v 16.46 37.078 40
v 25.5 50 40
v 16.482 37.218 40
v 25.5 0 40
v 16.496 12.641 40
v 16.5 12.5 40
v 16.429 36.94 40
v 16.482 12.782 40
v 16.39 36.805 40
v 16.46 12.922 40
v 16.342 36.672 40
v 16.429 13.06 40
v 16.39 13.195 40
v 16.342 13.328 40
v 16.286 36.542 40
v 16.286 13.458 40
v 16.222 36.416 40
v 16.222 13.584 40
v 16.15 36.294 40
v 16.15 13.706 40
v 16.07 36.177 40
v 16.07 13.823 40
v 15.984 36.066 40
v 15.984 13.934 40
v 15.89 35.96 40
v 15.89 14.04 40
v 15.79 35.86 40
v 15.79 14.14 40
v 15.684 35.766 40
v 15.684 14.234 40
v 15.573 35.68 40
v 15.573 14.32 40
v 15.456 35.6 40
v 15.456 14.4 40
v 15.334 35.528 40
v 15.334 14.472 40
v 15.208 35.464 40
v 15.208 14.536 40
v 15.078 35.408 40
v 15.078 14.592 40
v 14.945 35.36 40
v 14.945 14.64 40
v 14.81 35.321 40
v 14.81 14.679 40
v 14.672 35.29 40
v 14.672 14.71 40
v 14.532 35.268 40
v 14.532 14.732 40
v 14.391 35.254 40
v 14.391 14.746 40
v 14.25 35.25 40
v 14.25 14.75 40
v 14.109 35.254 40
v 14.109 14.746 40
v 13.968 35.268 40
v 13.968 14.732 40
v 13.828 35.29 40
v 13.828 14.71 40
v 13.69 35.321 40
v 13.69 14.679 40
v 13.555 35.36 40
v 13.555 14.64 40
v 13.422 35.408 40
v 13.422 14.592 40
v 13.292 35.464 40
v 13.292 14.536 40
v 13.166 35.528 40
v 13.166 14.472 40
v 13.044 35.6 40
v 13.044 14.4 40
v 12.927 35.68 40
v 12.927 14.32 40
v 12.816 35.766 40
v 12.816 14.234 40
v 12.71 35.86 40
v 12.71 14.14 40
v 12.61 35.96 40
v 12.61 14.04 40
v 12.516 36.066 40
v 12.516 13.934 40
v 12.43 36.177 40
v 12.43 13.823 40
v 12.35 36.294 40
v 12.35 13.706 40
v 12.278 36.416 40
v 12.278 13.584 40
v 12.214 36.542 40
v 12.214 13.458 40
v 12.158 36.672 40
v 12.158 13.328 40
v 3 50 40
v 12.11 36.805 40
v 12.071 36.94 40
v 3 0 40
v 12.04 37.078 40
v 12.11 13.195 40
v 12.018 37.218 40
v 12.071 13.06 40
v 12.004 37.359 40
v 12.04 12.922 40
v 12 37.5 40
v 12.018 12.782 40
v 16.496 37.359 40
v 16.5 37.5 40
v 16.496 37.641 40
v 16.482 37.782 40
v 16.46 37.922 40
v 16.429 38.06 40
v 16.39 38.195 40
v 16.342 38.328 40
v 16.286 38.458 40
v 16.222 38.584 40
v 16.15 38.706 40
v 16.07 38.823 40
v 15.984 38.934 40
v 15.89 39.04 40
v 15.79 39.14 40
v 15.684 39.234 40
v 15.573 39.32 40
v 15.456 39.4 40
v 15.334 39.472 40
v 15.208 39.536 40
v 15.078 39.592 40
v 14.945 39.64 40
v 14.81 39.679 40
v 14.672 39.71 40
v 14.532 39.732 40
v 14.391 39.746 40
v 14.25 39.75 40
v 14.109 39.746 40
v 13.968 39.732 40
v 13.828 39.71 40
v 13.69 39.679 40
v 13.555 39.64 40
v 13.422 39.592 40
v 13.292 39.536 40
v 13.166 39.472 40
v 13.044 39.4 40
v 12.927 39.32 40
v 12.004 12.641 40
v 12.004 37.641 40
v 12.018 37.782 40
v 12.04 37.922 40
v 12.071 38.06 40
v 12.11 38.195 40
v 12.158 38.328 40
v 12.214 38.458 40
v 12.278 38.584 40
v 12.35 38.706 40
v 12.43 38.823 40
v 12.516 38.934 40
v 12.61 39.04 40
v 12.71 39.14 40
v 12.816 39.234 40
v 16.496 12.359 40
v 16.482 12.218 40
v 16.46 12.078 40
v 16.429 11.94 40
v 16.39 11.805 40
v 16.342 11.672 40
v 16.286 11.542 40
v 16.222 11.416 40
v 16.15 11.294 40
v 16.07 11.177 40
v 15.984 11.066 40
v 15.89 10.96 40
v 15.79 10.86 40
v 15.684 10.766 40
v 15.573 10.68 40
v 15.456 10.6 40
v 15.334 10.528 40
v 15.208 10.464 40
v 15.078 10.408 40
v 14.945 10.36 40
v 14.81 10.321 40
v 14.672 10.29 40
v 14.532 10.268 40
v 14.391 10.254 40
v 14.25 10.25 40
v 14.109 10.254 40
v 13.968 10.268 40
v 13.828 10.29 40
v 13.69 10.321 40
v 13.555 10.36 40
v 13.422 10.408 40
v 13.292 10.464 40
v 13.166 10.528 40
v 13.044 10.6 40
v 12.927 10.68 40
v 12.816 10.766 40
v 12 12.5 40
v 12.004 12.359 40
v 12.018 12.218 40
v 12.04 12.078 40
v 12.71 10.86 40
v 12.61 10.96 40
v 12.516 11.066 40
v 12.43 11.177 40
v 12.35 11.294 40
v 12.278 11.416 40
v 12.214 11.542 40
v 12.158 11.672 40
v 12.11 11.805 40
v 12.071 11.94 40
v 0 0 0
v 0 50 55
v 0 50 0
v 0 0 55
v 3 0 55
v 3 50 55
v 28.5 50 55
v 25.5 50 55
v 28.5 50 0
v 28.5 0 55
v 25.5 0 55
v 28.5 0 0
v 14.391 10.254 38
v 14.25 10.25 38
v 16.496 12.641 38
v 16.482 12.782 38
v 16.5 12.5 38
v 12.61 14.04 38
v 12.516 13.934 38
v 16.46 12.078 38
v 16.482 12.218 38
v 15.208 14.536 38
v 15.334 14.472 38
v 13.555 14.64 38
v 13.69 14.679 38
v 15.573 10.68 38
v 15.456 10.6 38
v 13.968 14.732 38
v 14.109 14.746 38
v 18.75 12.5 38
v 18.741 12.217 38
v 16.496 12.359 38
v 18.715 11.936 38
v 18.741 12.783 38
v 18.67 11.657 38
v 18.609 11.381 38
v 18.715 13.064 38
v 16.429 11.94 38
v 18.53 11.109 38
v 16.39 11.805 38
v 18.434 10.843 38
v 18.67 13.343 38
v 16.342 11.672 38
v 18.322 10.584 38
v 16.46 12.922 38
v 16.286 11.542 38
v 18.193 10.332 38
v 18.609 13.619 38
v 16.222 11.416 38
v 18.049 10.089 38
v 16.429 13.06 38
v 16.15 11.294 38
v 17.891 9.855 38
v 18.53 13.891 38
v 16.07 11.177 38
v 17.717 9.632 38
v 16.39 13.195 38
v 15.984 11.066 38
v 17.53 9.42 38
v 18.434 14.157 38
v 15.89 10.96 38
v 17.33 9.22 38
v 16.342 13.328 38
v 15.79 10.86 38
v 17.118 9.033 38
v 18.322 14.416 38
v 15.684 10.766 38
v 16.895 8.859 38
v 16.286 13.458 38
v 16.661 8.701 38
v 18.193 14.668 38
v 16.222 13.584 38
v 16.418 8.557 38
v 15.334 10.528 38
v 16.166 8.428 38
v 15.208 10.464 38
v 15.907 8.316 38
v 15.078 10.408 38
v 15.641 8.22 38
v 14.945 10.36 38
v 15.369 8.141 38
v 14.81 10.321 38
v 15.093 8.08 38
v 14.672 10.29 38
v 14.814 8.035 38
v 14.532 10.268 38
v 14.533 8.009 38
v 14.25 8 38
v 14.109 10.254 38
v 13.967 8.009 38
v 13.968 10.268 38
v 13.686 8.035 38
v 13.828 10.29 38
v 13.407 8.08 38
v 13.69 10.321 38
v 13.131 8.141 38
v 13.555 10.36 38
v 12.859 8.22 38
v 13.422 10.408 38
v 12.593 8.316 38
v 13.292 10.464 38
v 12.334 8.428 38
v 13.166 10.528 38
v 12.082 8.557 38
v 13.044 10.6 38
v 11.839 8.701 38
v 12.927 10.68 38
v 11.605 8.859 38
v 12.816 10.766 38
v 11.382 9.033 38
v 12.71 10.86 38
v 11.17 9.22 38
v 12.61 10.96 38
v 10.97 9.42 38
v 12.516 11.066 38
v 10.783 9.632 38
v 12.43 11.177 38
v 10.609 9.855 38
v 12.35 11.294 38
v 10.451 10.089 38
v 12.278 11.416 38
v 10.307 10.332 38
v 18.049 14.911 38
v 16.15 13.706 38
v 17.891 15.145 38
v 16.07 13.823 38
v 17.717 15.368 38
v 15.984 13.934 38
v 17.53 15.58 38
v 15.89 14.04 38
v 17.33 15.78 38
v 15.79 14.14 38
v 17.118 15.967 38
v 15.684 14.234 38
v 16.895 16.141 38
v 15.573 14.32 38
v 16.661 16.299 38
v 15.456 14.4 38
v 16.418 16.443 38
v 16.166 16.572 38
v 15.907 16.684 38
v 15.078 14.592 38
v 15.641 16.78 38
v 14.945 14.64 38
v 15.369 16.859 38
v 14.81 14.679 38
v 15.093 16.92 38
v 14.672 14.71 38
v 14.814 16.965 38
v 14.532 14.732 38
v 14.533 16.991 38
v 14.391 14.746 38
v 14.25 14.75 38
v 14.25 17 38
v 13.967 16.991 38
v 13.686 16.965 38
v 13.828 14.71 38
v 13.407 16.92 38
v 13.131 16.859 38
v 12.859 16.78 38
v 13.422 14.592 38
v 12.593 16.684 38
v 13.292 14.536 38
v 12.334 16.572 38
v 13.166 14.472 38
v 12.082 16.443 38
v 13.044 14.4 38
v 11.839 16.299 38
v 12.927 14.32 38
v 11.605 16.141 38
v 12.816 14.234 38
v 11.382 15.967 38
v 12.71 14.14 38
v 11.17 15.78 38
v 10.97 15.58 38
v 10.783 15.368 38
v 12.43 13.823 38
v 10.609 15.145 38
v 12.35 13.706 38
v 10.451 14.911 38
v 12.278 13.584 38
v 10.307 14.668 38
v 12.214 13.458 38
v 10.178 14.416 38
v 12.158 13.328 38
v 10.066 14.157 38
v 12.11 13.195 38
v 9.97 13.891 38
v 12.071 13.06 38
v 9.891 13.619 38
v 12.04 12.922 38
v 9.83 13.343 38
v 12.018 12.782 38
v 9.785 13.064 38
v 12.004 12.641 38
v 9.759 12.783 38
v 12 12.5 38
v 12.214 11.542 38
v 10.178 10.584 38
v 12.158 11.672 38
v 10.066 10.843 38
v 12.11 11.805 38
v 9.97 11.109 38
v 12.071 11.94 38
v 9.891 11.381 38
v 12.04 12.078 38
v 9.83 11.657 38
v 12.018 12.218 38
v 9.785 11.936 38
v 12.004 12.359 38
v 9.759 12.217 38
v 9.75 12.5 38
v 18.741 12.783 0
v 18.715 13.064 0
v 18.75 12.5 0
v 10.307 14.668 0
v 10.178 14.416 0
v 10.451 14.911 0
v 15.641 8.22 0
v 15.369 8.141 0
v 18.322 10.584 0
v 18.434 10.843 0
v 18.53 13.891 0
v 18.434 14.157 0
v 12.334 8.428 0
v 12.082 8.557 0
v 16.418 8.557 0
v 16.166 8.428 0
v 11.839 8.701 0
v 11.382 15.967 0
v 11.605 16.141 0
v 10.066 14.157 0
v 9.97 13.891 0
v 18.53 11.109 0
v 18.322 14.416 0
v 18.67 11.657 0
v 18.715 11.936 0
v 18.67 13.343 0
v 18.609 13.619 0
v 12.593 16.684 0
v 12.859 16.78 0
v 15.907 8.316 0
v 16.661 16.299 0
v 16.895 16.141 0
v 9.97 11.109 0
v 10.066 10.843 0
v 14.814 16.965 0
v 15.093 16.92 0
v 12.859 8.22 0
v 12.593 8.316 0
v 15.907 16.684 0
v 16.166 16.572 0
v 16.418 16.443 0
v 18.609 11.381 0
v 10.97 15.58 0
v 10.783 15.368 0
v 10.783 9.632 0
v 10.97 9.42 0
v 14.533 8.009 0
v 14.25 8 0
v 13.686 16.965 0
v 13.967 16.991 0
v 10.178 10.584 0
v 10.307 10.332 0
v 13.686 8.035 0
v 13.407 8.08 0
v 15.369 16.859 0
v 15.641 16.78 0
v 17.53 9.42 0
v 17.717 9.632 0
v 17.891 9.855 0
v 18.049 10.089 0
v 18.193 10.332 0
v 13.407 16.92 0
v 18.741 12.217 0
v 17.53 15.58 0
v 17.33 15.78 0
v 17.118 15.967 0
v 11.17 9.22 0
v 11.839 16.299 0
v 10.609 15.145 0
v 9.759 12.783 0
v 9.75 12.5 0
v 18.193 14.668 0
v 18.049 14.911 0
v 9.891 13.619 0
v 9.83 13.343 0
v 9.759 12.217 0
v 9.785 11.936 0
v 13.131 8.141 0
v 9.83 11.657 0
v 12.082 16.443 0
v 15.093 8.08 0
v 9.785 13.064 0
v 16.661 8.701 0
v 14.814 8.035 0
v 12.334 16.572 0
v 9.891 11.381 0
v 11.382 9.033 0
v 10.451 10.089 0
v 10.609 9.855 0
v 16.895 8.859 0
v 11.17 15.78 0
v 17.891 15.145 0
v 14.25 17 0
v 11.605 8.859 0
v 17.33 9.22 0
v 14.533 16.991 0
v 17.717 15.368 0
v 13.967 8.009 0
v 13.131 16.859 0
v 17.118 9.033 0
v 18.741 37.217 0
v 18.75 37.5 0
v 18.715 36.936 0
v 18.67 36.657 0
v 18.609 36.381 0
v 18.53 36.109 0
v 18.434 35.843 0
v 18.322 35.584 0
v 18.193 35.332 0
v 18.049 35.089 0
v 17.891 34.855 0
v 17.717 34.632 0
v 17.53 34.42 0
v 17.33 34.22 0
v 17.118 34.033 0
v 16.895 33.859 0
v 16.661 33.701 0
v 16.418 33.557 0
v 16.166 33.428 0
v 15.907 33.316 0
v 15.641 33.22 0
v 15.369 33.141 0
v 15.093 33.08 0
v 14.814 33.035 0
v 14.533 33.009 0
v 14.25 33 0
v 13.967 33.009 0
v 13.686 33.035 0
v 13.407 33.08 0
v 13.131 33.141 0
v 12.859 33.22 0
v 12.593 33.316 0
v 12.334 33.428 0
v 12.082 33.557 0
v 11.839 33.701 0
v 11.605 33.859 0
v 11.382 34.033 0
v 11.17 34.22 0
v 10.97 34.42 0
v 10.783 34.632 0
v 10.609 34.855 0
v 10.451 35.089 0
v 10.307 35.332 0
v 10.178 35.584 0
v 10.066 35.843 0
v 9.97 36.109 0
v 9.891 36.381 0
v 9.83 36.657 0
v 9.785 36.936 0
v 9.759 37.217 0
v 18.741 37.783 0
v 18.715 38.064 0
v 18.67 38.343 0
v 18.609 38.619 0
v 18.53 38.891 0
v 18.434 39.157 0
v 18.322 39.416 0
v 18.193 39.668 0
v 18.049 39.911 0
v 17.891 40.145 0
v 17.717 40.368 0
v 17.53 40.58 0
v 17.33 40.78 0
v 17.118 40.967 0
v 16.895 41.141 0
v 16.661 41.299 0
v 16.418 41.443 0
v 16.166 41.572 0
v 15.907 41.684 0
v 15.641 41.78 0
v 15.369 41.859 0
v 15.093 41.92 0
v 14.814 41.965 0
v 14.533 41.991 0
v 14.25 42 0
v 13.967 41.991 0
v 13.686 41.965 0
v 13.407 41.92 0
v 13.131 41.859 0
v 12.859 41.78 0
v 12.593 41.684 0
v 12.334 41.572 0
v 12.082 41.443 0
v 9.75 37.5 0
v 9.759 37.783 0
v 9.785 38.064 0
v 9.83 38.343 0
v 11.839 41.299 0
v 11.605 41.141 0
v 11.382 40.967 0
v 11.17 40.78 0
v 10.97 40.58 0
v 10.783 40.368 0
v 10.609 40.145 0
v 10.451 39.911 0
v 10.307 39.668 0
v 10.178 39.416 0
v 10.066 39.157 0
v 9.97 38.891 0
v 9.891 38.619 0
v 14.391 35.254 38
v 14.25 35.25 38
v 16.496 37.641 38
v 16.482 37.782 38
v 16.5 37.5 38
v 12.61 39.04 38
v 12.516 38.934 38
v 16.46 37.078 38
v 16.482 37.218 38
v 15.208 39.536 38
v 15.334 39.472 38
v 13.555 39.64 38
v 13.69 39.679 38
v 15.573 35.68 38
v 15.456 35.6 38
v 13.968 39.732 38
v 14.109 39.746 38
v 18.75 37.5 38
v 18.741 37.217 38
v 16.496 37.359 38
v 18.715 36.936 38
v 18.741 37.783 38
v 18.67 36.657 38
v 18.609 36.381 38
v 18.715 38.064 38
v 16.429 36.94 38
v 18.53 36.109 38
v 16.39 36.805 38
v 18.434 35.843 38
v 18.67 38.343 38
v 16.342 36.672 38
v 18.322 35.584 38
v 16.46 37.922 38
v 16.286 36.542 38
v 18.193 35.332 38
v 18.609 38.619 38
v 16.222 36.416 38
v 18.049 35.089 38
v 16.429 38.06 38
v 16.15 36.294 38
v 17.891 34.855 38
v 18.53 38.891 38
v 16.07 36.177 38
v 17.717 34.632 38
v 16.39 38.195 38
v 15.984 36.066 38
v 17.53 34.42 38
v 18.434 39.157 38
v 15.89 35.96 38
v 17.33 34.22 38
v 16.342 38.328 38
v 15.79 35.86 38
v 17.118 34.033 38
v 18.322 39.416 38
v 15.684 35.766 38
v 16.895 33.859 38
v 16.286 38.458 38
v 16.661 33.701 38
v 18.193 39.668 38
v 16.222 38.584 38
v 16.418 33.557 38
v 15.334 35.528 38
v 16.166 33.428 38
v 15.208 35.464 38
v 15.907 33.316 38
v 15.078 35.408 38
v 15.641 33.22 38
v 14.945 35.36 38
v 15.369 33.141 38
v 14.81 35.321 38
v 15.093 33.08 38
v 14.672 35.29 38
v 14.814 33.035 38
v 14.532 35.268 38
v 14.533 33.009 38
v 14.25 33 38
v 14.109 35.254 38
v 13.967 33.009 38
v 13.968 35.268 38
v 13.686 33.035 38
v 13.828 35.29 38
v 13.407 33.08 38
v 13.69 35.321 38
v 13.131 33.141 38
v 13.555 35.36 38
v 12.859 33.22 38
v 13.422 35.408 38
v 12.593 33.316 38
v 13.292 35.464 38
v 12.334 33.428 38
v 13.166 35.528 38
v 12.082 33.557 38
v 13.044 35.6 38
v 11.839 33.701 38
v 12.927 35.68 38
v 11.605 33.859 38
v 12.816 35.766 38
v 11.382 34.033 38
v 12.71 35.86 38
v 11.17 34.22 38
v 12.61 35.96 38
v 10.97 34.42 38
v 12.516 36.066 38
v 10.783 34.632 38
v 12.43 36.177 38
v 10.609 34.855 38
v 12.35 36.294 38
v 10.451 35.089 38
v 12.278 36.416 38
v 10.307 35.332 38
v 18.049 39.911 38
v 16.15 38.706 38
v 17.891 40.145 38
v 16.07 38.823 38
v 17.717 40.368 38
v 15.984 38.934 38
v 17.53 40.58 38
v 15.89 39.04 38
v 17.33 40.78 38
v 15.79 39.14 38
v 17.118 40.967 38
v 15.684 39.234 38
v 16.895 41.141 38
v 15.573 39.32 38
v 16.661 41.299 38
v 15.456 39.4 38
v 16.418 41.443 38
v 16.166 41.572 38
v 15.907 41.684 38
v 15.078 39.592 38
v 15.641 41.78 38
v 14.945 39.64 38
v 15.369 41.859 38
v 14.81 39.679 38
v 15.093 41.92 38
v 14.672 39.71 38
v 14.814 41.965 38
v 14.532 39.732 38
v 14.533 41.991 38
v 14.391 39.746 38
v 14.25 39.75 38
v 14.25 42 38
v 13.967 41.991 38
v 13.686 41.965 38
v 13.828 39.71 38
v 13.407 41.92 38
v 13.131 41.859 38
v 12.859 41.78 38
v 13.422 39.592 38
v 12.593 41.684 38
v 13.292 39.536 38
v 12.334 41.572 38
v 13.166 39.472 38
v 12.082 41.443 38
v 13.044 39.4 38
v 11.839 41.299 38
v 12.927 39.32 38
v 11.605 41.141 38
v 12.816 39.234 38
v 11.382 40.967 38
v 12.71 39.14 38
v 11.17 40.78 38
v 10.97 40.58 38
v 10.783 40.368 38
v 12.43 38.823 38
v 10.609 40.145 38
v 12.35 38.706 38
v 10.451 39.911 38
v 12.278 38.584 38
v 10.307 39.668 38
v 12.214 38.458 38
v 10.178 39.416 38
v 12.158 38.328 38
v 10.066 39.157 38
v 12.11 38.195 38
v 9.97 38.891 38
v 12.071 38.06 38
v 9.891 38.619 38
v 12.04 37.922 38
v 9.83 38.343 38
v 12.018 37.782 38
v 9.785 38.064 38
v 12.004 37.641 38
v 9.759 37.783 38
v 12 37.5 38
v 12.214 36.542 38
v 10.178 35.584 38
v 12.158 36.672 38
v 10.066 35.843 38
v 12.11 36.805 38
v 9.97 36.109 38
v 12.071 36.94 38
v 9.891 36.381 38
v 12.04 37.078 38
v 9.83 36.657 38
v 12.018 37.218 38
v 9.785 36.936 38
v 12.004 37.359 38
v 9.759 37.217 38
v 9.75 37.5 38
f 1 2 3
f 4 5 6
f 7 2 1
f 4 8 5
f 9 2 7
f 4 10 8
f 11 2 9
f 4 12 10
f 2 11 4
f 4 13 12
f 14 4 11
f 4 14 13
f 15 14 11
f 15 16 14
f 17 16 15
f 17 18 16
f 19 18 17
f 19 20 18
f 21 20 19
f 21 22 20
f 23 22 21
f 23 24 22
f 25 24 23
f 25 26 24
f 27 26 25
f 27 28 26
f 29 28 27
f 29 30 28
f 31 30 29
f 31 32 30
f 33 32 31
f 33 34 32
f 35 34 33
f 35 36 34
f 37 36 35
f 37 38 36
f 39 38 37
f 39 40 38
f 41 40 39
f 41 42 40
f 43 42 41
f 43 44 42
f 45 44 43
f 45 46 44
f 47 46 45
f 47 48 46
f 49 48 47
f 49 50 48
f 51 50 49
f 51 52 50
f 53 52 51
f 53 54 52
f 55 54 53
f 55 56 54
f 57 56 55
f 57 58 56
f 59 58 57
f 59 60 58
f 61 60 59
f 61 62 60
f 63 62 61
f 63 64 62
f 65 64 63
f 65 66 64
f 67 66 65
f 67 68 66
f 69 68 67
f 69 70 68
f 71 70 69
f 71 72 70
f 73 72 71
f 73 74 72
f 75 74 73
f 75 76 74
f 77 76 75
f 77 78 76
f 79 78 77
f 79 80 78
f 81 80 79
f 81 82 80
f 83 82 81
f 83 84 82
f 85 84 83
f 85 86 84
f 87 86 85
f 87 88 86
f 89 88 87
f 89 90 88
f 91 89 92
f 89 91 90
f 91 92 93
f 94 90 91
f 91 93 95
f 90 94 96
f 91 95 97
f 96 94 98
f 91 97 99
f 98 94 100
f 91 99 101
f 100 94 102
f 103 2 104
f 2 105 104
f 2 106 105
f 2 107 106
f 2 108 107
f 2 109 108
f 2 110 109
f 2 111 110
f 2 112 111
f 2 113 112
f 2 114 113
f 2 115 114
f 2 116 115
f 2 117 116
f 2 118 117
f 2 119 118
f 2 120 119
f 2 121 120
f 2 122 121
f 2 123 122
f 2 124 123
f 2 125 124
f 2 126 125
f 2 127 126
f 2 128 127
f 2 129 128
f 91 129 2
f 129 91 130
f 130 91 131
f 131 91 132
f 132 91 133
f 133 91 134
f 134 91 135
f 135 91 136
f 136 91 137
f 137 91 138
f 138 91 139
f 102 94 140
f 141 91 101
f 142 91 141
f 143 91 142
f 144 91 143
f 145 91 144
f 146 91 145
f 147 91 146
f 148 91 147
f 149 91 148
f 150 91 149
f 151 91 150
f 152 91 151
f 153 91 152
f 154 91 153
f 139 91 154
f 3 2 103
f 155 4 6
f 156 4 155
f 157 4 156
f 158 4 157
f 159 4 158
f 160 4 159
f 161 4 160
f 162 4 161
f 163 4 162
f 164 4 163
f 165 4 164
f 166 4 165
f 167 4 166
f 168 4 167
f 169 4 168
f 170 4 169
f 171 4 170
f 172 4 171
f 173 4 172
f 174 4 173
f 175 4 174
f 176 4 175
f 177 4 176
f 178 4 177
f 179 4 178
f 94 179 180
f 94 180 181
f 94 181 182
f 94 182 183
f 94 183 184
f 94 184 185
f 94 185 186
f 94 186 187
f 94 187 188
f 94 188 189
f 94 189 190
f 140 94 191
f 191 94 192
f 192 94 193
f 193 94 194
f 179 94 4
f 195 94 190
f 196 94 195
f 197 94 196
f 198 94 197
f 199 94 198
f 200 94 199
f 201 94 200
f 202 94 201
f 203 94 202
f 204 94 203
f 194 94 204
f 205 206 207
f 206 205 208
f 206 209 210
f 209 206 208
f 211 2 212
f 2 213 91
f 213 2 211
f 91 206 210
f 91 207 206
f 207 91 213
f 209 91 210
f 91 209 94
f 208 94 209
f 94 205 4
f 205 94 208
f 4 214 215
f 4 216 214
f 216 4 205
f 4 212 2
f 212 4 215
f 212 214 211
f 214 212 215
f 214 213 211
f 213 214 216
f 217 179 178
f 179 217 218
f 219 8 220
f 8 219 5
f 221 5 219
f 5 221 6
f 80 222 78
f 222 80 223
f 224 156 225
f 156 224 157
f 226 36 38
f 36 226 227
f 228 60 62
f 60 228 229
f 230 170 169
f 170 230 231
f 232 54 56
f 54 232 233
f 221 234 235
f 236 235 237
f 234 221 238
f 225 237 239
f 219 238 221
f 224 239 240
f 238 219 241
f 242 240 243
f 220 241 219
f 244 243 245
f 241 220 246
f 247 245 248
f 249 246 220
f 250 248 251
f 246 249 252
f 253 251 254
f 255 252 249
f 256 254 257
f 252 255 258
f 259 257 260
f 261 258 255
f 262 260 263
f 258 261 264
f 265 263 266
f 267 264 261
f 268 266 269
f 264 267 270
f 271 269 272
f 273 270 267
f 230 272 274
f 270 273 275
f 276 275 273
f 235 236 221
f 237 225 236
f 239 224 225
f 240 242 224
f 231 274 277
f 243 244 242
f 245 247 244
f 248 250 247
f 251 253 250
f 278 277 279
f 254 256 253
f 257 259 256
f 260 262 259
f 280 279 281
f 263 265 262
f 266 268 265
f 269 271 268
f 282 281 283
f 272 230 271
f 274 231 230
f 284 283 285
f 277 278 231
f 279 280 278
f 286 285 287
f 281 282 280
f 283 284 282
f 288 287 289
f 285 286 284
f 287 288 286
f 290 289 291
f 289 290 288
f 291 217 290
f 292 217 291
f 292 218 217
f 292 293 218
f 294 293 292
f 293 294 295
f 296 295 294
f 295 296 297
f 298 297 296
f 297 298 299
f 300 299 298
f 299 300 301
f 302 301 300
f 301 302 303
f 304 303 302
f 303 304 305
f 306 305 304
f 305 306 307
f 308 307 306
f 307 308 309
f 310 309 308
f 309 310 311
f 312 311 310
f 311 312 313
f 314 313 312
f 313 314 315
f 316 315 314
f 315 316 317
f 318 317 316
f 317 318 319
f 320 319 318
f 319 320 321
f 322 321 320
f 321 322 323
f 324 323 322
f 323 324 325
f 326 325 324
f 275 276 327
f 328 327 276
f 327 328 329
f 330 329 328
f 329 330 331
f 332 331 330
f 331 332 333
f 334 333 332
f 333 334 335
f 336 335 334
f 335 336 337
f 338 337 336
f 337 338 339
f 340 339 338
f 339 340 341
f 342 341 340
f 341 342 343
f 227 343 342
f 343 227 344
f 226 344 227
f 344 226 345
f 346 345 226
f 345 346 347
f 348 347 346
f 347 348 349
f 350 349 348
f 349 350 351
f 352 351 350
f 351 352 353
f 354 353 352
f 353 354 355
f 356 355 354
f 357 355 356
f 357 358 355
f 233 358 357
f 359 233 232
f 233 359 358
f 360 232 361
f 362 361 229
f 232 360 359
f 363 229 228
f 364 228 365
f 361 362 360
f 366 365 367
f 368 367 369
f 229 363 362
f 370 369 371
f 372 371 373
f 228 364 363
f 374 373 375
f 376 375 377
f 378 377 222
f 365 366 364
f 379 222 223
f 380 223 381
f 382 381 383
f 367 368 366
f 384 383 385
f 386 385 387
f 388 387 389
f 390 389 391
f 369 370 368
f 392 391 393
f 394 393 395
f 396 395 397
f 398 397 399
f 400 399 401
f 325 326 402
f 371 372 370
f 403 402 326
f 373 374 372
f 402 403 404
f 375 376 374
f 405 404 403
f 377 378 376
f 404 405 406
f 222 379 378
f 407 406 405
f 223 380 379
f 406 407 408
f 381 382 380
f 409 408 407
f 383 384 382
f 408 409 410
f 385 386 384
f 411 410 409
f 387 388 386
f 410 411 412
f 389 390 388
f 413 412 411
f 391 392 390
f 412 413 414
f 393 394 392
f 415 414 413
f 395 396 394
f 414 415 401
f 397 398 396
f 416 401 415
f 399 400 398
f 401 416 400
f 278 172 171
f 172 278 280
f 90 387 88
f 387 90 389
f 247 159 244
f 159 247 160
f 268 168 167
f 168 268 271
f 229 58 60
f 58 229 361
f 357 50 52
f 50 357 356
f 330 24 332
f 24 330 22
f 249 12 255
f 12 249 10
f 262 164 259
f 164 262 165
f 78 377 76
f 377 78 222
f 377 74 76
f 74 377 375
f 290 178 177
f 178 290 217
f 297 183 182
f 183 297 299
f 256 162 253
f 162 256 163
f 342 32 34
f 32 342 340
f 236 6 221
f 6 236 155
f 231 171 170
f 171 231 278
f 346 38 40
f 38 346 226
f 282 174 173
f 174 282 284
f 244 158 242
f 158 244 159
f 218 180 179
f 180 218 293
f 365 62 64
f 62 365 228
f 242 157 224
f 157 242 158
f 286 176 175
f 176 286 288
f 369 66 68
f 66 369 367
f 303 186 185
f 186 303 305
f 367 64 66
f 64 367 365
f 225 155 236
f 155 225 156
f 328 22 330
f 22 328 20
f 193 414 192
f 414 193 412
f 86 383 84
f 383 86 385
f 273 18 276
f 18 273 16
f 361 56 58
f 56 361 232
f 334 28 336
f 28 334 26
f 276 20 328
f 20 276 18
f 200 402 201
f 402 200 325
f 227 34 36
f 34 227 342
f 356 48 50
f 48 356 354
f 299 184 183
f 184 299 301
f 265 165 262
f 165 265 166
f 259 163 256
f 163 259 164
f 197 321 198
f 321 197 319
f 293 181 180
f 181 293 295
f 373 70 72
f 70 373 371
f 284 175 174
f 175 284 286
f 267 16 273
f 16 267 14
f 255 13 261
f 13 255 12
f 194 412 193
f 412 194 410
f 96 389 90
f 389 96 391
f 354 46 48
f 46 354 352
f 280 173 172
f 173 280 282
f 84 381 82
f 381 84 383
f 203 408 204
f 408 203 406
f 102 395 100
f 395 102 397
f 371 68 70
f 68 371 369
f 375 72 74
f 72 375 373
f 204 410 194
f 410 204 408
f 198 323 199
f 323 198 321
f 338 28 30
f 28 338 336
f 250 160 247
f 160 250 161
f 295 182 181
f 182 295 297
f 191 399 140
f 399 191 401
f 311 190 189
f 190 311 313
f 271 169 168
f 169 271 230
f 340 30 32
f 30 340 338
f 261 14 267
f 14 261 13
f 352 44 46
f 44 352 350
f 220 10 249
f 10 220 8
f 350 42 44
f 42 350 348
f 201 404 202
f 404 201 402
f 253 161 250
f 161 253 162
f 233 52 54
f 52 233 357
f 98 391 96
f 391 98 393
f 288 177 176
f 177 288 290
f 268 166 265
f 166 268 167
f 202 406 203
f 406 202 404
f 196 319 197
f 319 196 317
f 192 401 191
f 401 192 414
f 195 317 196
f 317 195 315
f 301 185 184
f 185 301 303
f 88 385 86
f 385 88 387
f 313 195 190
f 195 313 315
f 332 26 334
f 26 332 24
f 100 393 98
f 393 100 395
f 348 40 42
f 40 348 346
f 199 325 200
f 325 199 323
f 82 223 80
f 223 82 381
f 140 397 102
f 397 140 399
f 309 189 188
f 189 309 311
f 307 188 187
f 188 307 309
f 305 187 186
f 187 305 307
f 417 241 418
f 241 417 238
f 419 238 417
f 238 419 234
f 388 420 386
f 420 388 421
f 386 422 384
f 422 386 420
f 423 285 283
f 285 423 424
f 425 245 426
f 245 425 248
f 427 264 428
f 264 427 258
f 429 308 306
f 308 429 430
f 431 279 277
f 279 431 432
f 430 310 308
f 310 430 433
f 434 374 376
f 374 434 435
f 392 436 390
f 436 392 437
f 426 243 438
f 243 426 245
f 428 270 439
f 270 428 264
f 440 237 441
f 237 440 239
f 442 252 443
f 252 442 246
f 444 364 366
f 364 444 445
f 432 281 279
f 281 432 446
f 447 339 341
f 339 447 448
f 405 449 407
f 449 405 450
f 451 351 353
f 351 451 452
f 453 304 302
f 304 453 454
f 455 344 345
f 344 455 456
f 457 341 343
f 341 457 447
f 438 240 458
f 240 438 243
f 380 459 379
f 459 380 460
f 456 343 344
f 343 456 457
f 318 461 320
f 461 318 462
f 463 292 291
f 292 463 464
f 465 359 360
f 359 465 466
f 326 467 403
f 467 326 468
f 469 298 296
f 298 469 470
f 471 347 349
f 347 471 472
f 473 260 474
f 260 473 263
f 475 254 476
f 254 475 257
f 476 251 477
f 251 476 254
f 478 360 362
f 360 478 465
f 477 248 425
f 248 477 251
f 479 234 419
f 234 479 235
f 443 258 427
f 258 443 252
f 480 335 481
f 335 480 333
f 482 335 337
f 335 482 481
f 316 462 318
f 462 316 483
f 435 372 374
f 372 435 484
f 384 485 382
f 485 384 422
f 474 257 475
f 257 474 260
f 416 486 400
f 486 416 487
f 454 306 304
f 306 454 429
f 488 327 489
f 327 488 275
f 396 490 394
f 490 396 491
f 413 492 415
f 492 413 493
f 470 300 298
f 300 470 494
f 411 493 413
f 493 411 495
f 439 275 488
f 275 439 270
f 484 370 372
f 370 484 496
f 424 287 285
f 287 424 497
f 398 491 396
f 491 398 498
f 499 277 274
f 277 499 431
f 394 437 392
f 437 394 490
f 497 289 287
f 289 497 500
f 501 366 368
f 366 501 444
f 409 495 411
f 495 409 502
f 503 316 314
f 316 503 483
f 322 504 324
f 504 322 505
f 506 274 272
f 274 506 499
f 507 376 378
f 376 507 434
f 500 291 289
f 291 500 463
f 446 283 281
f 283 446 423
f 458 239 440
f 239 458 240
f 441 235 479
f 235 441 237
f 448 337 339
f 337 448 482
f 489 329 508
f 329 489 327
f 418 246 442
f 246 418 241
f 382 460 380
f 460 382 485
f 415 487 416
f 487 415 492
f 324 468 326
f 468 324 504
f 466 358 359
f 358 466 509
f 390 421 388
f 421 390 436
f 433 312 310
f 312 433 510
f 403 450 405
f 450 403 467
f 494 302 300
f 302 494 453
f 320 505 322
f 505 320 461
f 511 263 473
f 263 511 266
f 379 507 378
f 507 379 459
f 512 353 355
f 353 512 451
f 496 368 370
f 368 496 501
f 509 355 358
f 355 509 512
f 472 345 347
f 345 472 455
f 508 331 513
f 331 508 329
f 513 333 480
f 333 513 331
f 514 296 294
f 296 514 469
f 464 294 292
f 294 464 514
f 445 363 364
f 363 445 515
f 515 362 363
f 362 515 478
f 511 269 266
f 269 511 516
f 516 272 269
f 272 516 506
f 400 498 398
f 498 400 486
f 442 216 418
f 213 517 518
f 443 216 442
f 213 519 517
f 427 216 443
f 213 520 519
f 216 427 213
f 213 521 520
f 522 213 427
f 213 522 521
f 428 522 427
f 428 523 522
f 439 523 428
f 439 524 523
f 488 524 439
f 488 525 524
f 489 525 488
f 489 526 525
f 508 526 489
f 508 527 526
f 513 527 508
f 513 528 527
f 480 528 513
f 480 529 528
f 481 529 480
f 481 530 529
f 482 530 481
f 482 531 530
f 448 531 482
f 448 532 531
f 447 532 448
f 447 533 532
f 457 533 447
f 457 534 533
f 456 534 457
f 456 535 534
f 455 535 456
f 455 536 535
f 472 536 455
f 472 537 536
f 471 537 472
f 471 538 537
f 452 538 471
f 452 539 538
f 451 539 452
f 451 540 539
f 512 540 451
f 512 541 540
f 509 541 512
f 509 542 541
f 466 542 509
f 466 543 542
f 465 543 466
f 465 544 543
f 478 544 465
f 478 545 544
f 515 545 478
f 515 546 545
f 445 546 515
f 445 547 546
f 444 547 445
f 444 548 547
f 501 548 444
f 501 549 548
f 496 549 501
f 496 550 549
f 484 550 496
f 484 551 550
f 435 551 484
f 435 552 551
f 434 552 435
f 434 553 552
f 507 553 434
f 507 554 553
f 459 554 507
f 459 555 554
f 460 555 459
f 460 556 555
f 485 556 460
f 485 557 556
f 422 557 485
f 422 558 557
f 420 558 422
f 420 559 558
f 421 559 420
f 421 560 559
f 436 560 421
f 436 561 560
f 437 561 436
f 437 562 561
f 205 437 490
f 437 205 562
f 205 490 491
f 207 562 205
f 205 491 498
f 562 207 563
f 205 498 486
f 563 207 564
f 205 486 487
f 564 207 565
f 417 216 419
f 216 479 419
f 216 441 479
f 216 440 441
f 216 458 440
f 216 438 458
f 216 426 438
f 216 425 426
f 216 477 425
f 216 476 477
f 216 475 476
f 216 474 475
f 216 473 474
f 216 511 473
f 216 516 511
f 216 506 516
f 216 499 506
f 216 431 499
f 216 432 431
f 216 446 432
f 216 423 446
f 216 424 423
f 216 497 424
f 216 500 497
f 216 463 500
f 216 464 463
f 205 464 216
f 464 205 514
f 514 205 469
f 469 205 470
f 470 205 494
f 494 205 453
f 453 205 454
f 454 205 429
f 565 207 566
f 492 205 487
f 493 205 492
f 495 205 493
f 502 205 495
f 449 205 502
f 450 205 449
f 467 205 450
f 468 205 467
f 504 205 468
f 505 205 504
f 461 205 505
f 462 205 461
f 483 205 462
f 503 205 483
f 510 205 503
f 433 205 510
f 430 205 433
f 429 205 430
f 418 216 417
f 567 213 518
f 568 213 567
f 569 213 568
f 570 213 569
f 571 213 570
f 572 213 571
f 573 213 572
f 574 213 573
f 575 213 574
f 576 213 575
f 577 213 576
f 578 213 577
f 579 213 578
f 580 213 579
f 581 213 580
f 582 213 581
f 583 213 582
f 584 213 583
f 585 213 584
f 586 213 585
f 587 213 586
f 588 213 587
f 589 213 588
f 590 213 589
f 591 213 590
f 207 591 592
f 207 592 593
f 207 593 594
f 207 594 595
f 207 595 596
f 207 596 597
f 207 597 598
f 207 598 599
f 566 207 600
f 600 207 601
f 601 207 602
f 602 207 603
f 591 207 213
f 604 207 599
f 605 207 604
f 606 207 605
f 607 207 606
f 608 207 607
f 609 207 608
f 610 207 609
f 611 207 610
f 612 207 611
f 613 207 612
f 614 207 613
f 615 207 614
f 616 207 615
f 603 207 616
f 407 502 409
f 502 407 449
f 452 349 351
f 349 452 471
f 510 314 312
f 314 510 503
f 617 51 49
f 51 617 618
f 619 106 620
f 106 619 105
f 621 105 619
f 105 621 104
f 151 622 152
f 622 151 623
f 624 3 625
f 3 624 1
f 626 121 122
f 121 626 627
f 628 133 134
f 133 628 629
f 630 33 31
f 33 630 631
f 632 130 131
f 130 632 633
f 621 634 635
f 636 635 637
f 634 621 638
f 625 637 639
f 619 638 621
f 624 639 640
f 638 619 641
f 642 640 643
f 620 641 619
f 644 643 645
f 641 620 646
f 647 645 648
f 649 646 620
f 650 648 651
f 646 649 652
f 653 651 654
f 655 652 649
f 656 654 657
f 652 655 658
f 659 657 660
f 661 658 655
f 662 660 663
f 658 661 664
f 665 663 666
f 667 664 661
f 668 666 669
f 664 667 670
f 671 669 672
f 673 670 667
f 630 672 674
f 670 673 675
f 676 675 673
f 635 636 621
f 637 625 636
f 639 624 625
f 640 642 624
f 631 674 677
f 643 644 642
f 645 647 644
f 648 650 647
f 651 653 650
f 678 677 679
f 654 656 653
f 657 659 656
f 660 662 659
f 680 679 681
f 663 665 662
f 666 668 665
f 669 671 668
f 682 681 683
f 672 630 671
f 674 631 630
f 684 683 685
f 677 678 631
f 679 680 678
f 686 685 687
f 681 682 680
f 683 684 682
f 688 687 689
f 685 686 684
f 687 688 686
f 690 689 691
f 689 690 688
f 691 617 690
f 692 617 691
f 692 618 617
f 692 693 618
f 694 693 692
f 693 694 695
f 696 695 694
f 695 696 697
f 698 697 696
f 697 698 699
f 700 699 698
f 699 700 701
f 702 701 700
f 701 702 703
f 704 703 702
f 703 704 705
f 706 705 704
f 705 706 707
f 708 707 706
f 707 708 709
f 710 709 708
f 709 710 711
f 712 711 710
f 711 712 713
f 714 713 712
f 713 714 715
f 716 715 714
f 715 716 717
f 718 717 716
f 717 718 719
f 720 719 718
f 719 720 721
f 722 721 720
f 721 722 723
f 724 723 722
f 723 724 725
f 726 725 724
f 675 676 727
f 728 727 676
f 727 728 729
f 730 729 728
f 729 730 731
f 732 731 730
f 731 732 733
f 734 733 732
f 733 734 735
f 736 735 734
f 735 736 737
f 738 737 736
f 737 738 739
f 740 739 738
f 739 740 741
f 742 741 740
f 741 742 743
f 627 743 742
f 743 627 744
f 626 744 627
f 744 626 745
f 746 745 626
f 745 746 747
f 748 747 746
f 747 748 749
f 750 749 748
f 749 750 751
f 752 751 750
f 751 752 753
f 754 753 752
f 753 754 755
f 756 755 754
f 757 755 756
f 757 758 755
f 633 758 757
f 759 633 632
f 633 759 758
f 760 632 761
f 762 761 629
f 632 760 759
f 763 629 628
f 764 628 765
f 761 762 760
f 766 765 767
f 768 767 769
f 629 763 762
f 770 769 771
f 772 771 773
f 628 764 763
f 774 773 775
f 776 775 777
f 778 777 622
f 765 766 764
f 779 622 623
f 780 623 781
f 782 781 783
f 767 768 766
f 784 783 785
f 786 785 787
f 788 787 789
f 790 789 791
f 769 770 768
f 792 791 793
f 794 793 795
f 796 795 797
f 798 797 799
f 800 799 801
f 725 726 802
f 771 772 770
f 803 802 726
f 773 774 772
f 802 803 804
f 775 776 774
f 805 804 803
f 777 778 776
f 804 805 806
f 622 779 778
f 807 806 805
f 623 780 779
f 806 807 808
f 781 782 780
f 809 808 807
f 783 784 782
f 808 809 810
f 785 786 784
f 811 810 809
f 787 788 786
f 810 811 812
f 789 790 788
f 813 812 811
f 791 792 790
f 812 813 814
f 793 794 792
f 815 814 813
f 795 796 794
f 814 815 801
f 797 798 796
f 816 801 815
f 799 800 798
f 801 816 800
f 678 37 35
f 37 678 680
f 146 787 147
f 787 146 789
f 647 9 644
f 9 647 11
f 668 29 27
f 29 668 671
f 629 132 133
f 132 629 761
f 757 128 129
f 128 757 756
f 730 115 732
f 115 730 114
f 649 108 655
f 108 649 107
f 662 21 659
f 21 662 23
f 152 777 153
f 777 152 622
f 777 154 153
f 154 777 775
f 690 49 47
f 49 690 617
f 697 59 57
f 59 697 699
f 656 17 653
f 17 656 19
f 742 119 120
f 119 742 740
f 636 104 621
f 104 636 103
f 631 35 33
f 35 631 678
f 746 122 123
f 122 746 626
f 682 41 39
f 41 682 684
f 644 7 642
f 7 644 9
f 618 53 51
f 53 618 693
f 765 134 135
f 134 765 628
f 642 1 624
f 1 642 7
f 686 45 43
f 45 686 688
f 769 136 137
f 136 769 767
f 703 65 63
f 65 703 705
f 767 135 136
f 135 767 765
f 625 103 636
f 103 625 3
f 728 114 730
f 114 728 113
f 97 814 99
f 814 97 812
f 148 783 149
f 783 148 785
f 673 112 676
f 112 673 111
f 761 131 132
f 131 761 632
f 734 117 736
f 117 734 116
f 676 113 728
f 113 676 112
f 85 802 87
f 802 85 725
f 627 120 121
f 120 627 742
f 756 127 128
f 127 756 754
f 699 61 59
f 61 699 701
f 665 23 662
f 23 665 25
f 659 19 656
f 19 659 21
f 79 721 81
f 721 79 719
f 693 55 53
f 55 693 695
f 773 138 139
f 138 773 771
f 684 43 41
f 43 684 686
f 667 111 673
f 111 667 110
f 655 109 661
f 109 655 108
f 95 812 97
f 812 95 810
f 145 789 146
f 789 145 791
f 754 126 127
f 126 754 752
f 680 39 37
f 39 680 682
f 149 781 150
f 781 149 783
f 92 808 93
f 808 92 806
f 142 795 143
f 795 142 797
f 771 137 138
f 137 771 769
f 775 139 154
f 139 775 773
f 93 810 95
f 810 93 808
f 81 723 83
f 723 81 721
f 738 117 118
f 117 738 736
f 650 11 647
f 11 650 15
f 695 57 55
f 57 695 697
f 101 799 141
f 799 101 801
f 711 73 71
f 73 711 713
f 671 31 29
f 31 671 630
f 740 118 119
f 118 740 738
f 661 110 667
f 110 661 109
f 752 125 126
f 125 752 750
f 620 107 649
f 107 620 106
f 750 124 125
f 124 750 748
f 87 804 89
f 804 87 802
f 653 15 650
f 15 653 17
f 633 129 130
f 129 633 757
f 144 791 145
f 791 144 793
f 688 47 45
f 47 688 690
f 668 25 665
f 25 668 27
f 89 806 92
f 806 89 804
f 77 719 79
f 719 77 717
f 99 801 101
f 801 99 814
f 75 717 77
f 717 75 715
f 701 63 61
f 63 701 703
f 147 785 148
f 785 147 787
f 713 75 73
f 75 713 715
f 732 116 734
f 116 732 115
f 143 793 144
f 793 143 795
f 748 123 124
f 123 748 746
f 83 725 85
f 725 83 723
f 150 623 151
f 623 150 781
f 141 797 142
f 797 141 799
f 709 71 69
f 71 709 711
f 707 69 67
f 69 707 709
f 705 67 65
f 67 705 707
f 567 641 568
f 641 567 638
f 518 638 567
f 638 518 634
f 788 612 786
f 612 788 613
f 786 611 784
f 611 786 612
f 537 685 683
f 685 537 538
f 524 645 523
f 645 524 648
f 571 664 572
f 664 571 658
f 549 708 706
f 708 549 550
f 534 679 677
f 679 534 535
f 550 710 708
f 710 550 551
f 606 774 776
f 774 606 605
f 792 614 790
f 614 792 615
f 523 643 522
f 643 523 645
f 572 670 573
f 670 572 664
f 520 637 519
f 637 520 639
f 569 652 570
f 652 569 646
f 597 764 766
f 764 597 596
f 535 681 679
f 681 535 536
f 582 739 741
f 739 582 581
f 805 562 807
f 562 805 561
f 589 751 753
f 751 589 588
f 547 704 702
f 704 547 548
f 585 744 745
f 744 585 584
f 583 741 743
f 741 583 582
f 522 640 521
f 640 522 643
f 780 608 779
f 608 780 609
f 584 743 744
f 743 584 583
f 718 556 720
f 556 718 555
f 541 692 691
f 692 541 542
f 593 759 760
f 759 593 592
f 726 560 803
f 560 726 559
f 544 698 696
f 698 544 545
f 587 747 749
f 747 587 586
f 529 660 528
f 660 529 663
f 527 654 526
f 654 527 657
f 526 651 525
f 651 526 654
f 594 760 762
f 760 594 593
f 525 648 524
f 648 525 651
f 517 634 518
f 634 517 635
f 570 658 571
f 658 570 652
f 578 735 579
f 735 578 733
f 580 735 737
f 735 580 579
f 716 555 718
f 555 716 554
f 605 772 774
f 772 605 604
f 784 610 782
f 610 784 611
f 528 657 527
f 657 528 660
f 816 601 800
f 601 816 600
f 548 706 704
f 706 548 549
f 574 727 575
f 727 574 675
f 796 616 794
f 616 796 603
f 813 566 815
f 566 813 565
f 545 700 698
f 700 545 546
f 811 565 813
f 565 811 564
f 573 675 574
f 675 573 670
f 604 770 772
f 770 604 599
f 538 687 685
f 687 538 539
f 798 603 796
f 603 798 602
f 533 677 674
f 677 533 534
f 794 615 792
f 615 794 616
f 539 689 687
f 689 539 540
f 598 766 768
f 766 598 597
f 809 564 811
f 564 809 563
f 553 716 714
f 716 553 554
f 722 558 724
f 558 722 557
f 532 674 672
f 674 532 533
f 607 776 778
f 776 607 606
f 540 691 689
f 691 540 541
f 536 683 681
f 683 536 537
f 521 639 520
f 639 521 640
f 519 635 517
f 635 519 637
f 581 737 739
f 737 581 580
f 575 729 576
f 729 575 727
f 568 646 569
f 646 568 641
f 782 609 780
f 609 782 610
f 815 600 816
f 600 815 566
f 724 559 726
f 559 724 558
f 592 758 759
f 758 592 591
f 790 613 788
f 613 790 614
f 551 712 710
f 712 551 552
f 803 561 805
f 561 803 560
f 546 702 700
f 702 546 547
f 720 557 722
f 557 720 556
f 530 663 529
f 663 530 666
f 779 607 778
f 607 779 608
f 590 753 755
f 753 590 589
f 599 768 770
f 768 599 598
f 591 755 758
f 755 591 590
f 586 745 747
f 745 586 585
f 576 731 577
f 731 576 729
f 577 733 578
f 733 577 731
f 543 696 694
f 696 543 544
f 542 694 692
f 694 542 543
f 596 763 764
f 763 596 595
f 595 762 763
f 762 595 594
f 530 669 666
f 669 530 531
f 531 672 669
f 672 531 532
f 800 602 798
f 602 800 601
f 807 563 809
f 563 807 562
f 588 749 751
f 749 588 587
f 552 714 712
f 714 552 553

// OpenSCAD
// preview[view:south east, tilt:top diagonal]



/* [Screw holes] */

// The screw hole radius at the bottom. The top screw hole is half of this. Wiggle is applied.
screwHoleRadius = 4;



/* [Dimensions] */

// Depth of the whole thing.
depth = 50;

// Width of the slot sides.
sideWidth = 3;

// Width of the slot. This should equal to the width of your table leg. Wiggle is applied.
slotWidth = 22;

// Height of the slot.
slotHeight = 15;

// Height of the base underneath slot. This is how much your table gets taller.
baseHeight = 40;



/* [Extras] */

// Extra room/width added to the screw holes and to the slot. If you took exact measurements you want to add some extra space for easier handling.
wiggle = 0.5; // [0:None, 0.5:Little bit, 1:A lot]



/* [Hidden] */

_screwHoleRadius = screwHoleRadius + wiggle;
_slotWidth = slotWidth + wiggle;
width = _slotWidth + 2 * sideWidth;
height = slotHeight + baseHeight;



zero() Leg();

module Leg() {
    Cradle();
    Base();
}

module Base() {
    difference() {
        translate([-sideWidth, 0, -baseHeight])
            Block(width, depth, baseHeight);

        translate([_slotWidth / 2, 1/4 * depth, 0])
            ScrewHole();
    
        translate([_slotWidth / 2, 3/4 * depth, 0])
            ScrewHole();
    }
}

module Cradle() {
    translate([-sideWidth, 0, 0]) Side();
    translate([_slotWidth, 0, 0]) Side();
}

module Side() {
    Block(sideWidth, depth, slotHeight);
}

module ScrewHole() {
    topHeight = 2;
    topRadius = _screwHoleRadius / 2;

    bodyHeight = baseHeight - topHeight;
    bodyRadius = _screwHoleRadius;

    translate([0, 0, -topHeight])
        Barrel(topHeight, topRadius);
    translate([0, 0, -(topHeight + bodyHeight)])
        Barrel(bodyHeight, bodyRadius);
}



module Block(x = 1, y = 1, z = 1) {
    linear_extrude(height = z, convexity = 4)
        square(size = [x, y], center = false);
}

module Barrel(h = 1, r = 1) {
    cylinder(h, r, r, center = false, $fn = 100);
}

module zero() {
    translate([sideWidth, 0, baseHeight])
        children();
}
